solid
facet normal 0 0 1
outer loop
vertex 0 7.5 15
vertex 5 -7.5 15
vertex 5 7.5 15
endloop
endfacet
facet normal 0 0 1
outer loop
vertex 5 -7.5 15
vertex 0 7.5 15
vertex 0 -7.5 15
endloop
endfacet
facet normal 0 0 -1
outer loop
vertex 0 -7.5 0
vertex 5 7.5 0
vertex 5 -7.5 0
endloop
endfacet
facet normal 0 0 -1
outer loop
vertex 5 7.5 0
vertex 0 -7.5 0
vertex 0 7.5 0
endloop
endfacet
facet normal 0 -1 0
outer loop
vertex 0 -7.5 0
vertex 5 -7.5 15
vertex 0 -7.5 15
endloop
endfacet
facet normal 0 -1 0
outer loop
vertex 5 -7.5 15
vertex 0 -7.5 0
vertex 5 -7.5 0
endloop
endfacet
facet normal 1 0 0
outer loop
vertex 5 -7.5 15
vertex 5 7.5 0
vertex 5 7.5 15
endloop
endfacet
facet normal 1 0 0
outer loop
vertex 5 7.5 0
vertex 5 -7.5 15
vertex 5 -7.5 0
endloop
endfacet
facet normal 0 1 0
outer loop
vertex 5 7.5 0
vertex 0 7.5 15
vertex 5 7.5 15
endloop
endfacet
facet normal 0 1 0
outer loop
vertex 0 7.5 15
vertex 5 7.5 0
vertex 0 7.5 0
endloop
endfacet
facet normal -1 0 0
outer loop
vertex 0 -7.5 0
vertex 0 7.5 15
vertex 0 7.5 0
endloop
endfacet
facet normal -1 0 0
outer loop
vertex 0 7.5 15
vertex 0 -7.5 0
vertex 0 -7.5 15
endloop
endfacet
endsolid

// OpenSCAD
// file: Library/center.scad
module center(axis){
	translate((axis / -2.0)){
		children();
	}
}
// main file
use <Library/center.scad>
//Length, width, height. Length is the thiccness of the paddle.
dimensions = [5, 15, 15];

module CylinderDispenser_Ejector_Paddle(dimensions){
	center([0, dimensions.y, 0]){
		cube(dimensions);
	}
}

CylinderDispenser_Ejector_Paddle(dimensions);
